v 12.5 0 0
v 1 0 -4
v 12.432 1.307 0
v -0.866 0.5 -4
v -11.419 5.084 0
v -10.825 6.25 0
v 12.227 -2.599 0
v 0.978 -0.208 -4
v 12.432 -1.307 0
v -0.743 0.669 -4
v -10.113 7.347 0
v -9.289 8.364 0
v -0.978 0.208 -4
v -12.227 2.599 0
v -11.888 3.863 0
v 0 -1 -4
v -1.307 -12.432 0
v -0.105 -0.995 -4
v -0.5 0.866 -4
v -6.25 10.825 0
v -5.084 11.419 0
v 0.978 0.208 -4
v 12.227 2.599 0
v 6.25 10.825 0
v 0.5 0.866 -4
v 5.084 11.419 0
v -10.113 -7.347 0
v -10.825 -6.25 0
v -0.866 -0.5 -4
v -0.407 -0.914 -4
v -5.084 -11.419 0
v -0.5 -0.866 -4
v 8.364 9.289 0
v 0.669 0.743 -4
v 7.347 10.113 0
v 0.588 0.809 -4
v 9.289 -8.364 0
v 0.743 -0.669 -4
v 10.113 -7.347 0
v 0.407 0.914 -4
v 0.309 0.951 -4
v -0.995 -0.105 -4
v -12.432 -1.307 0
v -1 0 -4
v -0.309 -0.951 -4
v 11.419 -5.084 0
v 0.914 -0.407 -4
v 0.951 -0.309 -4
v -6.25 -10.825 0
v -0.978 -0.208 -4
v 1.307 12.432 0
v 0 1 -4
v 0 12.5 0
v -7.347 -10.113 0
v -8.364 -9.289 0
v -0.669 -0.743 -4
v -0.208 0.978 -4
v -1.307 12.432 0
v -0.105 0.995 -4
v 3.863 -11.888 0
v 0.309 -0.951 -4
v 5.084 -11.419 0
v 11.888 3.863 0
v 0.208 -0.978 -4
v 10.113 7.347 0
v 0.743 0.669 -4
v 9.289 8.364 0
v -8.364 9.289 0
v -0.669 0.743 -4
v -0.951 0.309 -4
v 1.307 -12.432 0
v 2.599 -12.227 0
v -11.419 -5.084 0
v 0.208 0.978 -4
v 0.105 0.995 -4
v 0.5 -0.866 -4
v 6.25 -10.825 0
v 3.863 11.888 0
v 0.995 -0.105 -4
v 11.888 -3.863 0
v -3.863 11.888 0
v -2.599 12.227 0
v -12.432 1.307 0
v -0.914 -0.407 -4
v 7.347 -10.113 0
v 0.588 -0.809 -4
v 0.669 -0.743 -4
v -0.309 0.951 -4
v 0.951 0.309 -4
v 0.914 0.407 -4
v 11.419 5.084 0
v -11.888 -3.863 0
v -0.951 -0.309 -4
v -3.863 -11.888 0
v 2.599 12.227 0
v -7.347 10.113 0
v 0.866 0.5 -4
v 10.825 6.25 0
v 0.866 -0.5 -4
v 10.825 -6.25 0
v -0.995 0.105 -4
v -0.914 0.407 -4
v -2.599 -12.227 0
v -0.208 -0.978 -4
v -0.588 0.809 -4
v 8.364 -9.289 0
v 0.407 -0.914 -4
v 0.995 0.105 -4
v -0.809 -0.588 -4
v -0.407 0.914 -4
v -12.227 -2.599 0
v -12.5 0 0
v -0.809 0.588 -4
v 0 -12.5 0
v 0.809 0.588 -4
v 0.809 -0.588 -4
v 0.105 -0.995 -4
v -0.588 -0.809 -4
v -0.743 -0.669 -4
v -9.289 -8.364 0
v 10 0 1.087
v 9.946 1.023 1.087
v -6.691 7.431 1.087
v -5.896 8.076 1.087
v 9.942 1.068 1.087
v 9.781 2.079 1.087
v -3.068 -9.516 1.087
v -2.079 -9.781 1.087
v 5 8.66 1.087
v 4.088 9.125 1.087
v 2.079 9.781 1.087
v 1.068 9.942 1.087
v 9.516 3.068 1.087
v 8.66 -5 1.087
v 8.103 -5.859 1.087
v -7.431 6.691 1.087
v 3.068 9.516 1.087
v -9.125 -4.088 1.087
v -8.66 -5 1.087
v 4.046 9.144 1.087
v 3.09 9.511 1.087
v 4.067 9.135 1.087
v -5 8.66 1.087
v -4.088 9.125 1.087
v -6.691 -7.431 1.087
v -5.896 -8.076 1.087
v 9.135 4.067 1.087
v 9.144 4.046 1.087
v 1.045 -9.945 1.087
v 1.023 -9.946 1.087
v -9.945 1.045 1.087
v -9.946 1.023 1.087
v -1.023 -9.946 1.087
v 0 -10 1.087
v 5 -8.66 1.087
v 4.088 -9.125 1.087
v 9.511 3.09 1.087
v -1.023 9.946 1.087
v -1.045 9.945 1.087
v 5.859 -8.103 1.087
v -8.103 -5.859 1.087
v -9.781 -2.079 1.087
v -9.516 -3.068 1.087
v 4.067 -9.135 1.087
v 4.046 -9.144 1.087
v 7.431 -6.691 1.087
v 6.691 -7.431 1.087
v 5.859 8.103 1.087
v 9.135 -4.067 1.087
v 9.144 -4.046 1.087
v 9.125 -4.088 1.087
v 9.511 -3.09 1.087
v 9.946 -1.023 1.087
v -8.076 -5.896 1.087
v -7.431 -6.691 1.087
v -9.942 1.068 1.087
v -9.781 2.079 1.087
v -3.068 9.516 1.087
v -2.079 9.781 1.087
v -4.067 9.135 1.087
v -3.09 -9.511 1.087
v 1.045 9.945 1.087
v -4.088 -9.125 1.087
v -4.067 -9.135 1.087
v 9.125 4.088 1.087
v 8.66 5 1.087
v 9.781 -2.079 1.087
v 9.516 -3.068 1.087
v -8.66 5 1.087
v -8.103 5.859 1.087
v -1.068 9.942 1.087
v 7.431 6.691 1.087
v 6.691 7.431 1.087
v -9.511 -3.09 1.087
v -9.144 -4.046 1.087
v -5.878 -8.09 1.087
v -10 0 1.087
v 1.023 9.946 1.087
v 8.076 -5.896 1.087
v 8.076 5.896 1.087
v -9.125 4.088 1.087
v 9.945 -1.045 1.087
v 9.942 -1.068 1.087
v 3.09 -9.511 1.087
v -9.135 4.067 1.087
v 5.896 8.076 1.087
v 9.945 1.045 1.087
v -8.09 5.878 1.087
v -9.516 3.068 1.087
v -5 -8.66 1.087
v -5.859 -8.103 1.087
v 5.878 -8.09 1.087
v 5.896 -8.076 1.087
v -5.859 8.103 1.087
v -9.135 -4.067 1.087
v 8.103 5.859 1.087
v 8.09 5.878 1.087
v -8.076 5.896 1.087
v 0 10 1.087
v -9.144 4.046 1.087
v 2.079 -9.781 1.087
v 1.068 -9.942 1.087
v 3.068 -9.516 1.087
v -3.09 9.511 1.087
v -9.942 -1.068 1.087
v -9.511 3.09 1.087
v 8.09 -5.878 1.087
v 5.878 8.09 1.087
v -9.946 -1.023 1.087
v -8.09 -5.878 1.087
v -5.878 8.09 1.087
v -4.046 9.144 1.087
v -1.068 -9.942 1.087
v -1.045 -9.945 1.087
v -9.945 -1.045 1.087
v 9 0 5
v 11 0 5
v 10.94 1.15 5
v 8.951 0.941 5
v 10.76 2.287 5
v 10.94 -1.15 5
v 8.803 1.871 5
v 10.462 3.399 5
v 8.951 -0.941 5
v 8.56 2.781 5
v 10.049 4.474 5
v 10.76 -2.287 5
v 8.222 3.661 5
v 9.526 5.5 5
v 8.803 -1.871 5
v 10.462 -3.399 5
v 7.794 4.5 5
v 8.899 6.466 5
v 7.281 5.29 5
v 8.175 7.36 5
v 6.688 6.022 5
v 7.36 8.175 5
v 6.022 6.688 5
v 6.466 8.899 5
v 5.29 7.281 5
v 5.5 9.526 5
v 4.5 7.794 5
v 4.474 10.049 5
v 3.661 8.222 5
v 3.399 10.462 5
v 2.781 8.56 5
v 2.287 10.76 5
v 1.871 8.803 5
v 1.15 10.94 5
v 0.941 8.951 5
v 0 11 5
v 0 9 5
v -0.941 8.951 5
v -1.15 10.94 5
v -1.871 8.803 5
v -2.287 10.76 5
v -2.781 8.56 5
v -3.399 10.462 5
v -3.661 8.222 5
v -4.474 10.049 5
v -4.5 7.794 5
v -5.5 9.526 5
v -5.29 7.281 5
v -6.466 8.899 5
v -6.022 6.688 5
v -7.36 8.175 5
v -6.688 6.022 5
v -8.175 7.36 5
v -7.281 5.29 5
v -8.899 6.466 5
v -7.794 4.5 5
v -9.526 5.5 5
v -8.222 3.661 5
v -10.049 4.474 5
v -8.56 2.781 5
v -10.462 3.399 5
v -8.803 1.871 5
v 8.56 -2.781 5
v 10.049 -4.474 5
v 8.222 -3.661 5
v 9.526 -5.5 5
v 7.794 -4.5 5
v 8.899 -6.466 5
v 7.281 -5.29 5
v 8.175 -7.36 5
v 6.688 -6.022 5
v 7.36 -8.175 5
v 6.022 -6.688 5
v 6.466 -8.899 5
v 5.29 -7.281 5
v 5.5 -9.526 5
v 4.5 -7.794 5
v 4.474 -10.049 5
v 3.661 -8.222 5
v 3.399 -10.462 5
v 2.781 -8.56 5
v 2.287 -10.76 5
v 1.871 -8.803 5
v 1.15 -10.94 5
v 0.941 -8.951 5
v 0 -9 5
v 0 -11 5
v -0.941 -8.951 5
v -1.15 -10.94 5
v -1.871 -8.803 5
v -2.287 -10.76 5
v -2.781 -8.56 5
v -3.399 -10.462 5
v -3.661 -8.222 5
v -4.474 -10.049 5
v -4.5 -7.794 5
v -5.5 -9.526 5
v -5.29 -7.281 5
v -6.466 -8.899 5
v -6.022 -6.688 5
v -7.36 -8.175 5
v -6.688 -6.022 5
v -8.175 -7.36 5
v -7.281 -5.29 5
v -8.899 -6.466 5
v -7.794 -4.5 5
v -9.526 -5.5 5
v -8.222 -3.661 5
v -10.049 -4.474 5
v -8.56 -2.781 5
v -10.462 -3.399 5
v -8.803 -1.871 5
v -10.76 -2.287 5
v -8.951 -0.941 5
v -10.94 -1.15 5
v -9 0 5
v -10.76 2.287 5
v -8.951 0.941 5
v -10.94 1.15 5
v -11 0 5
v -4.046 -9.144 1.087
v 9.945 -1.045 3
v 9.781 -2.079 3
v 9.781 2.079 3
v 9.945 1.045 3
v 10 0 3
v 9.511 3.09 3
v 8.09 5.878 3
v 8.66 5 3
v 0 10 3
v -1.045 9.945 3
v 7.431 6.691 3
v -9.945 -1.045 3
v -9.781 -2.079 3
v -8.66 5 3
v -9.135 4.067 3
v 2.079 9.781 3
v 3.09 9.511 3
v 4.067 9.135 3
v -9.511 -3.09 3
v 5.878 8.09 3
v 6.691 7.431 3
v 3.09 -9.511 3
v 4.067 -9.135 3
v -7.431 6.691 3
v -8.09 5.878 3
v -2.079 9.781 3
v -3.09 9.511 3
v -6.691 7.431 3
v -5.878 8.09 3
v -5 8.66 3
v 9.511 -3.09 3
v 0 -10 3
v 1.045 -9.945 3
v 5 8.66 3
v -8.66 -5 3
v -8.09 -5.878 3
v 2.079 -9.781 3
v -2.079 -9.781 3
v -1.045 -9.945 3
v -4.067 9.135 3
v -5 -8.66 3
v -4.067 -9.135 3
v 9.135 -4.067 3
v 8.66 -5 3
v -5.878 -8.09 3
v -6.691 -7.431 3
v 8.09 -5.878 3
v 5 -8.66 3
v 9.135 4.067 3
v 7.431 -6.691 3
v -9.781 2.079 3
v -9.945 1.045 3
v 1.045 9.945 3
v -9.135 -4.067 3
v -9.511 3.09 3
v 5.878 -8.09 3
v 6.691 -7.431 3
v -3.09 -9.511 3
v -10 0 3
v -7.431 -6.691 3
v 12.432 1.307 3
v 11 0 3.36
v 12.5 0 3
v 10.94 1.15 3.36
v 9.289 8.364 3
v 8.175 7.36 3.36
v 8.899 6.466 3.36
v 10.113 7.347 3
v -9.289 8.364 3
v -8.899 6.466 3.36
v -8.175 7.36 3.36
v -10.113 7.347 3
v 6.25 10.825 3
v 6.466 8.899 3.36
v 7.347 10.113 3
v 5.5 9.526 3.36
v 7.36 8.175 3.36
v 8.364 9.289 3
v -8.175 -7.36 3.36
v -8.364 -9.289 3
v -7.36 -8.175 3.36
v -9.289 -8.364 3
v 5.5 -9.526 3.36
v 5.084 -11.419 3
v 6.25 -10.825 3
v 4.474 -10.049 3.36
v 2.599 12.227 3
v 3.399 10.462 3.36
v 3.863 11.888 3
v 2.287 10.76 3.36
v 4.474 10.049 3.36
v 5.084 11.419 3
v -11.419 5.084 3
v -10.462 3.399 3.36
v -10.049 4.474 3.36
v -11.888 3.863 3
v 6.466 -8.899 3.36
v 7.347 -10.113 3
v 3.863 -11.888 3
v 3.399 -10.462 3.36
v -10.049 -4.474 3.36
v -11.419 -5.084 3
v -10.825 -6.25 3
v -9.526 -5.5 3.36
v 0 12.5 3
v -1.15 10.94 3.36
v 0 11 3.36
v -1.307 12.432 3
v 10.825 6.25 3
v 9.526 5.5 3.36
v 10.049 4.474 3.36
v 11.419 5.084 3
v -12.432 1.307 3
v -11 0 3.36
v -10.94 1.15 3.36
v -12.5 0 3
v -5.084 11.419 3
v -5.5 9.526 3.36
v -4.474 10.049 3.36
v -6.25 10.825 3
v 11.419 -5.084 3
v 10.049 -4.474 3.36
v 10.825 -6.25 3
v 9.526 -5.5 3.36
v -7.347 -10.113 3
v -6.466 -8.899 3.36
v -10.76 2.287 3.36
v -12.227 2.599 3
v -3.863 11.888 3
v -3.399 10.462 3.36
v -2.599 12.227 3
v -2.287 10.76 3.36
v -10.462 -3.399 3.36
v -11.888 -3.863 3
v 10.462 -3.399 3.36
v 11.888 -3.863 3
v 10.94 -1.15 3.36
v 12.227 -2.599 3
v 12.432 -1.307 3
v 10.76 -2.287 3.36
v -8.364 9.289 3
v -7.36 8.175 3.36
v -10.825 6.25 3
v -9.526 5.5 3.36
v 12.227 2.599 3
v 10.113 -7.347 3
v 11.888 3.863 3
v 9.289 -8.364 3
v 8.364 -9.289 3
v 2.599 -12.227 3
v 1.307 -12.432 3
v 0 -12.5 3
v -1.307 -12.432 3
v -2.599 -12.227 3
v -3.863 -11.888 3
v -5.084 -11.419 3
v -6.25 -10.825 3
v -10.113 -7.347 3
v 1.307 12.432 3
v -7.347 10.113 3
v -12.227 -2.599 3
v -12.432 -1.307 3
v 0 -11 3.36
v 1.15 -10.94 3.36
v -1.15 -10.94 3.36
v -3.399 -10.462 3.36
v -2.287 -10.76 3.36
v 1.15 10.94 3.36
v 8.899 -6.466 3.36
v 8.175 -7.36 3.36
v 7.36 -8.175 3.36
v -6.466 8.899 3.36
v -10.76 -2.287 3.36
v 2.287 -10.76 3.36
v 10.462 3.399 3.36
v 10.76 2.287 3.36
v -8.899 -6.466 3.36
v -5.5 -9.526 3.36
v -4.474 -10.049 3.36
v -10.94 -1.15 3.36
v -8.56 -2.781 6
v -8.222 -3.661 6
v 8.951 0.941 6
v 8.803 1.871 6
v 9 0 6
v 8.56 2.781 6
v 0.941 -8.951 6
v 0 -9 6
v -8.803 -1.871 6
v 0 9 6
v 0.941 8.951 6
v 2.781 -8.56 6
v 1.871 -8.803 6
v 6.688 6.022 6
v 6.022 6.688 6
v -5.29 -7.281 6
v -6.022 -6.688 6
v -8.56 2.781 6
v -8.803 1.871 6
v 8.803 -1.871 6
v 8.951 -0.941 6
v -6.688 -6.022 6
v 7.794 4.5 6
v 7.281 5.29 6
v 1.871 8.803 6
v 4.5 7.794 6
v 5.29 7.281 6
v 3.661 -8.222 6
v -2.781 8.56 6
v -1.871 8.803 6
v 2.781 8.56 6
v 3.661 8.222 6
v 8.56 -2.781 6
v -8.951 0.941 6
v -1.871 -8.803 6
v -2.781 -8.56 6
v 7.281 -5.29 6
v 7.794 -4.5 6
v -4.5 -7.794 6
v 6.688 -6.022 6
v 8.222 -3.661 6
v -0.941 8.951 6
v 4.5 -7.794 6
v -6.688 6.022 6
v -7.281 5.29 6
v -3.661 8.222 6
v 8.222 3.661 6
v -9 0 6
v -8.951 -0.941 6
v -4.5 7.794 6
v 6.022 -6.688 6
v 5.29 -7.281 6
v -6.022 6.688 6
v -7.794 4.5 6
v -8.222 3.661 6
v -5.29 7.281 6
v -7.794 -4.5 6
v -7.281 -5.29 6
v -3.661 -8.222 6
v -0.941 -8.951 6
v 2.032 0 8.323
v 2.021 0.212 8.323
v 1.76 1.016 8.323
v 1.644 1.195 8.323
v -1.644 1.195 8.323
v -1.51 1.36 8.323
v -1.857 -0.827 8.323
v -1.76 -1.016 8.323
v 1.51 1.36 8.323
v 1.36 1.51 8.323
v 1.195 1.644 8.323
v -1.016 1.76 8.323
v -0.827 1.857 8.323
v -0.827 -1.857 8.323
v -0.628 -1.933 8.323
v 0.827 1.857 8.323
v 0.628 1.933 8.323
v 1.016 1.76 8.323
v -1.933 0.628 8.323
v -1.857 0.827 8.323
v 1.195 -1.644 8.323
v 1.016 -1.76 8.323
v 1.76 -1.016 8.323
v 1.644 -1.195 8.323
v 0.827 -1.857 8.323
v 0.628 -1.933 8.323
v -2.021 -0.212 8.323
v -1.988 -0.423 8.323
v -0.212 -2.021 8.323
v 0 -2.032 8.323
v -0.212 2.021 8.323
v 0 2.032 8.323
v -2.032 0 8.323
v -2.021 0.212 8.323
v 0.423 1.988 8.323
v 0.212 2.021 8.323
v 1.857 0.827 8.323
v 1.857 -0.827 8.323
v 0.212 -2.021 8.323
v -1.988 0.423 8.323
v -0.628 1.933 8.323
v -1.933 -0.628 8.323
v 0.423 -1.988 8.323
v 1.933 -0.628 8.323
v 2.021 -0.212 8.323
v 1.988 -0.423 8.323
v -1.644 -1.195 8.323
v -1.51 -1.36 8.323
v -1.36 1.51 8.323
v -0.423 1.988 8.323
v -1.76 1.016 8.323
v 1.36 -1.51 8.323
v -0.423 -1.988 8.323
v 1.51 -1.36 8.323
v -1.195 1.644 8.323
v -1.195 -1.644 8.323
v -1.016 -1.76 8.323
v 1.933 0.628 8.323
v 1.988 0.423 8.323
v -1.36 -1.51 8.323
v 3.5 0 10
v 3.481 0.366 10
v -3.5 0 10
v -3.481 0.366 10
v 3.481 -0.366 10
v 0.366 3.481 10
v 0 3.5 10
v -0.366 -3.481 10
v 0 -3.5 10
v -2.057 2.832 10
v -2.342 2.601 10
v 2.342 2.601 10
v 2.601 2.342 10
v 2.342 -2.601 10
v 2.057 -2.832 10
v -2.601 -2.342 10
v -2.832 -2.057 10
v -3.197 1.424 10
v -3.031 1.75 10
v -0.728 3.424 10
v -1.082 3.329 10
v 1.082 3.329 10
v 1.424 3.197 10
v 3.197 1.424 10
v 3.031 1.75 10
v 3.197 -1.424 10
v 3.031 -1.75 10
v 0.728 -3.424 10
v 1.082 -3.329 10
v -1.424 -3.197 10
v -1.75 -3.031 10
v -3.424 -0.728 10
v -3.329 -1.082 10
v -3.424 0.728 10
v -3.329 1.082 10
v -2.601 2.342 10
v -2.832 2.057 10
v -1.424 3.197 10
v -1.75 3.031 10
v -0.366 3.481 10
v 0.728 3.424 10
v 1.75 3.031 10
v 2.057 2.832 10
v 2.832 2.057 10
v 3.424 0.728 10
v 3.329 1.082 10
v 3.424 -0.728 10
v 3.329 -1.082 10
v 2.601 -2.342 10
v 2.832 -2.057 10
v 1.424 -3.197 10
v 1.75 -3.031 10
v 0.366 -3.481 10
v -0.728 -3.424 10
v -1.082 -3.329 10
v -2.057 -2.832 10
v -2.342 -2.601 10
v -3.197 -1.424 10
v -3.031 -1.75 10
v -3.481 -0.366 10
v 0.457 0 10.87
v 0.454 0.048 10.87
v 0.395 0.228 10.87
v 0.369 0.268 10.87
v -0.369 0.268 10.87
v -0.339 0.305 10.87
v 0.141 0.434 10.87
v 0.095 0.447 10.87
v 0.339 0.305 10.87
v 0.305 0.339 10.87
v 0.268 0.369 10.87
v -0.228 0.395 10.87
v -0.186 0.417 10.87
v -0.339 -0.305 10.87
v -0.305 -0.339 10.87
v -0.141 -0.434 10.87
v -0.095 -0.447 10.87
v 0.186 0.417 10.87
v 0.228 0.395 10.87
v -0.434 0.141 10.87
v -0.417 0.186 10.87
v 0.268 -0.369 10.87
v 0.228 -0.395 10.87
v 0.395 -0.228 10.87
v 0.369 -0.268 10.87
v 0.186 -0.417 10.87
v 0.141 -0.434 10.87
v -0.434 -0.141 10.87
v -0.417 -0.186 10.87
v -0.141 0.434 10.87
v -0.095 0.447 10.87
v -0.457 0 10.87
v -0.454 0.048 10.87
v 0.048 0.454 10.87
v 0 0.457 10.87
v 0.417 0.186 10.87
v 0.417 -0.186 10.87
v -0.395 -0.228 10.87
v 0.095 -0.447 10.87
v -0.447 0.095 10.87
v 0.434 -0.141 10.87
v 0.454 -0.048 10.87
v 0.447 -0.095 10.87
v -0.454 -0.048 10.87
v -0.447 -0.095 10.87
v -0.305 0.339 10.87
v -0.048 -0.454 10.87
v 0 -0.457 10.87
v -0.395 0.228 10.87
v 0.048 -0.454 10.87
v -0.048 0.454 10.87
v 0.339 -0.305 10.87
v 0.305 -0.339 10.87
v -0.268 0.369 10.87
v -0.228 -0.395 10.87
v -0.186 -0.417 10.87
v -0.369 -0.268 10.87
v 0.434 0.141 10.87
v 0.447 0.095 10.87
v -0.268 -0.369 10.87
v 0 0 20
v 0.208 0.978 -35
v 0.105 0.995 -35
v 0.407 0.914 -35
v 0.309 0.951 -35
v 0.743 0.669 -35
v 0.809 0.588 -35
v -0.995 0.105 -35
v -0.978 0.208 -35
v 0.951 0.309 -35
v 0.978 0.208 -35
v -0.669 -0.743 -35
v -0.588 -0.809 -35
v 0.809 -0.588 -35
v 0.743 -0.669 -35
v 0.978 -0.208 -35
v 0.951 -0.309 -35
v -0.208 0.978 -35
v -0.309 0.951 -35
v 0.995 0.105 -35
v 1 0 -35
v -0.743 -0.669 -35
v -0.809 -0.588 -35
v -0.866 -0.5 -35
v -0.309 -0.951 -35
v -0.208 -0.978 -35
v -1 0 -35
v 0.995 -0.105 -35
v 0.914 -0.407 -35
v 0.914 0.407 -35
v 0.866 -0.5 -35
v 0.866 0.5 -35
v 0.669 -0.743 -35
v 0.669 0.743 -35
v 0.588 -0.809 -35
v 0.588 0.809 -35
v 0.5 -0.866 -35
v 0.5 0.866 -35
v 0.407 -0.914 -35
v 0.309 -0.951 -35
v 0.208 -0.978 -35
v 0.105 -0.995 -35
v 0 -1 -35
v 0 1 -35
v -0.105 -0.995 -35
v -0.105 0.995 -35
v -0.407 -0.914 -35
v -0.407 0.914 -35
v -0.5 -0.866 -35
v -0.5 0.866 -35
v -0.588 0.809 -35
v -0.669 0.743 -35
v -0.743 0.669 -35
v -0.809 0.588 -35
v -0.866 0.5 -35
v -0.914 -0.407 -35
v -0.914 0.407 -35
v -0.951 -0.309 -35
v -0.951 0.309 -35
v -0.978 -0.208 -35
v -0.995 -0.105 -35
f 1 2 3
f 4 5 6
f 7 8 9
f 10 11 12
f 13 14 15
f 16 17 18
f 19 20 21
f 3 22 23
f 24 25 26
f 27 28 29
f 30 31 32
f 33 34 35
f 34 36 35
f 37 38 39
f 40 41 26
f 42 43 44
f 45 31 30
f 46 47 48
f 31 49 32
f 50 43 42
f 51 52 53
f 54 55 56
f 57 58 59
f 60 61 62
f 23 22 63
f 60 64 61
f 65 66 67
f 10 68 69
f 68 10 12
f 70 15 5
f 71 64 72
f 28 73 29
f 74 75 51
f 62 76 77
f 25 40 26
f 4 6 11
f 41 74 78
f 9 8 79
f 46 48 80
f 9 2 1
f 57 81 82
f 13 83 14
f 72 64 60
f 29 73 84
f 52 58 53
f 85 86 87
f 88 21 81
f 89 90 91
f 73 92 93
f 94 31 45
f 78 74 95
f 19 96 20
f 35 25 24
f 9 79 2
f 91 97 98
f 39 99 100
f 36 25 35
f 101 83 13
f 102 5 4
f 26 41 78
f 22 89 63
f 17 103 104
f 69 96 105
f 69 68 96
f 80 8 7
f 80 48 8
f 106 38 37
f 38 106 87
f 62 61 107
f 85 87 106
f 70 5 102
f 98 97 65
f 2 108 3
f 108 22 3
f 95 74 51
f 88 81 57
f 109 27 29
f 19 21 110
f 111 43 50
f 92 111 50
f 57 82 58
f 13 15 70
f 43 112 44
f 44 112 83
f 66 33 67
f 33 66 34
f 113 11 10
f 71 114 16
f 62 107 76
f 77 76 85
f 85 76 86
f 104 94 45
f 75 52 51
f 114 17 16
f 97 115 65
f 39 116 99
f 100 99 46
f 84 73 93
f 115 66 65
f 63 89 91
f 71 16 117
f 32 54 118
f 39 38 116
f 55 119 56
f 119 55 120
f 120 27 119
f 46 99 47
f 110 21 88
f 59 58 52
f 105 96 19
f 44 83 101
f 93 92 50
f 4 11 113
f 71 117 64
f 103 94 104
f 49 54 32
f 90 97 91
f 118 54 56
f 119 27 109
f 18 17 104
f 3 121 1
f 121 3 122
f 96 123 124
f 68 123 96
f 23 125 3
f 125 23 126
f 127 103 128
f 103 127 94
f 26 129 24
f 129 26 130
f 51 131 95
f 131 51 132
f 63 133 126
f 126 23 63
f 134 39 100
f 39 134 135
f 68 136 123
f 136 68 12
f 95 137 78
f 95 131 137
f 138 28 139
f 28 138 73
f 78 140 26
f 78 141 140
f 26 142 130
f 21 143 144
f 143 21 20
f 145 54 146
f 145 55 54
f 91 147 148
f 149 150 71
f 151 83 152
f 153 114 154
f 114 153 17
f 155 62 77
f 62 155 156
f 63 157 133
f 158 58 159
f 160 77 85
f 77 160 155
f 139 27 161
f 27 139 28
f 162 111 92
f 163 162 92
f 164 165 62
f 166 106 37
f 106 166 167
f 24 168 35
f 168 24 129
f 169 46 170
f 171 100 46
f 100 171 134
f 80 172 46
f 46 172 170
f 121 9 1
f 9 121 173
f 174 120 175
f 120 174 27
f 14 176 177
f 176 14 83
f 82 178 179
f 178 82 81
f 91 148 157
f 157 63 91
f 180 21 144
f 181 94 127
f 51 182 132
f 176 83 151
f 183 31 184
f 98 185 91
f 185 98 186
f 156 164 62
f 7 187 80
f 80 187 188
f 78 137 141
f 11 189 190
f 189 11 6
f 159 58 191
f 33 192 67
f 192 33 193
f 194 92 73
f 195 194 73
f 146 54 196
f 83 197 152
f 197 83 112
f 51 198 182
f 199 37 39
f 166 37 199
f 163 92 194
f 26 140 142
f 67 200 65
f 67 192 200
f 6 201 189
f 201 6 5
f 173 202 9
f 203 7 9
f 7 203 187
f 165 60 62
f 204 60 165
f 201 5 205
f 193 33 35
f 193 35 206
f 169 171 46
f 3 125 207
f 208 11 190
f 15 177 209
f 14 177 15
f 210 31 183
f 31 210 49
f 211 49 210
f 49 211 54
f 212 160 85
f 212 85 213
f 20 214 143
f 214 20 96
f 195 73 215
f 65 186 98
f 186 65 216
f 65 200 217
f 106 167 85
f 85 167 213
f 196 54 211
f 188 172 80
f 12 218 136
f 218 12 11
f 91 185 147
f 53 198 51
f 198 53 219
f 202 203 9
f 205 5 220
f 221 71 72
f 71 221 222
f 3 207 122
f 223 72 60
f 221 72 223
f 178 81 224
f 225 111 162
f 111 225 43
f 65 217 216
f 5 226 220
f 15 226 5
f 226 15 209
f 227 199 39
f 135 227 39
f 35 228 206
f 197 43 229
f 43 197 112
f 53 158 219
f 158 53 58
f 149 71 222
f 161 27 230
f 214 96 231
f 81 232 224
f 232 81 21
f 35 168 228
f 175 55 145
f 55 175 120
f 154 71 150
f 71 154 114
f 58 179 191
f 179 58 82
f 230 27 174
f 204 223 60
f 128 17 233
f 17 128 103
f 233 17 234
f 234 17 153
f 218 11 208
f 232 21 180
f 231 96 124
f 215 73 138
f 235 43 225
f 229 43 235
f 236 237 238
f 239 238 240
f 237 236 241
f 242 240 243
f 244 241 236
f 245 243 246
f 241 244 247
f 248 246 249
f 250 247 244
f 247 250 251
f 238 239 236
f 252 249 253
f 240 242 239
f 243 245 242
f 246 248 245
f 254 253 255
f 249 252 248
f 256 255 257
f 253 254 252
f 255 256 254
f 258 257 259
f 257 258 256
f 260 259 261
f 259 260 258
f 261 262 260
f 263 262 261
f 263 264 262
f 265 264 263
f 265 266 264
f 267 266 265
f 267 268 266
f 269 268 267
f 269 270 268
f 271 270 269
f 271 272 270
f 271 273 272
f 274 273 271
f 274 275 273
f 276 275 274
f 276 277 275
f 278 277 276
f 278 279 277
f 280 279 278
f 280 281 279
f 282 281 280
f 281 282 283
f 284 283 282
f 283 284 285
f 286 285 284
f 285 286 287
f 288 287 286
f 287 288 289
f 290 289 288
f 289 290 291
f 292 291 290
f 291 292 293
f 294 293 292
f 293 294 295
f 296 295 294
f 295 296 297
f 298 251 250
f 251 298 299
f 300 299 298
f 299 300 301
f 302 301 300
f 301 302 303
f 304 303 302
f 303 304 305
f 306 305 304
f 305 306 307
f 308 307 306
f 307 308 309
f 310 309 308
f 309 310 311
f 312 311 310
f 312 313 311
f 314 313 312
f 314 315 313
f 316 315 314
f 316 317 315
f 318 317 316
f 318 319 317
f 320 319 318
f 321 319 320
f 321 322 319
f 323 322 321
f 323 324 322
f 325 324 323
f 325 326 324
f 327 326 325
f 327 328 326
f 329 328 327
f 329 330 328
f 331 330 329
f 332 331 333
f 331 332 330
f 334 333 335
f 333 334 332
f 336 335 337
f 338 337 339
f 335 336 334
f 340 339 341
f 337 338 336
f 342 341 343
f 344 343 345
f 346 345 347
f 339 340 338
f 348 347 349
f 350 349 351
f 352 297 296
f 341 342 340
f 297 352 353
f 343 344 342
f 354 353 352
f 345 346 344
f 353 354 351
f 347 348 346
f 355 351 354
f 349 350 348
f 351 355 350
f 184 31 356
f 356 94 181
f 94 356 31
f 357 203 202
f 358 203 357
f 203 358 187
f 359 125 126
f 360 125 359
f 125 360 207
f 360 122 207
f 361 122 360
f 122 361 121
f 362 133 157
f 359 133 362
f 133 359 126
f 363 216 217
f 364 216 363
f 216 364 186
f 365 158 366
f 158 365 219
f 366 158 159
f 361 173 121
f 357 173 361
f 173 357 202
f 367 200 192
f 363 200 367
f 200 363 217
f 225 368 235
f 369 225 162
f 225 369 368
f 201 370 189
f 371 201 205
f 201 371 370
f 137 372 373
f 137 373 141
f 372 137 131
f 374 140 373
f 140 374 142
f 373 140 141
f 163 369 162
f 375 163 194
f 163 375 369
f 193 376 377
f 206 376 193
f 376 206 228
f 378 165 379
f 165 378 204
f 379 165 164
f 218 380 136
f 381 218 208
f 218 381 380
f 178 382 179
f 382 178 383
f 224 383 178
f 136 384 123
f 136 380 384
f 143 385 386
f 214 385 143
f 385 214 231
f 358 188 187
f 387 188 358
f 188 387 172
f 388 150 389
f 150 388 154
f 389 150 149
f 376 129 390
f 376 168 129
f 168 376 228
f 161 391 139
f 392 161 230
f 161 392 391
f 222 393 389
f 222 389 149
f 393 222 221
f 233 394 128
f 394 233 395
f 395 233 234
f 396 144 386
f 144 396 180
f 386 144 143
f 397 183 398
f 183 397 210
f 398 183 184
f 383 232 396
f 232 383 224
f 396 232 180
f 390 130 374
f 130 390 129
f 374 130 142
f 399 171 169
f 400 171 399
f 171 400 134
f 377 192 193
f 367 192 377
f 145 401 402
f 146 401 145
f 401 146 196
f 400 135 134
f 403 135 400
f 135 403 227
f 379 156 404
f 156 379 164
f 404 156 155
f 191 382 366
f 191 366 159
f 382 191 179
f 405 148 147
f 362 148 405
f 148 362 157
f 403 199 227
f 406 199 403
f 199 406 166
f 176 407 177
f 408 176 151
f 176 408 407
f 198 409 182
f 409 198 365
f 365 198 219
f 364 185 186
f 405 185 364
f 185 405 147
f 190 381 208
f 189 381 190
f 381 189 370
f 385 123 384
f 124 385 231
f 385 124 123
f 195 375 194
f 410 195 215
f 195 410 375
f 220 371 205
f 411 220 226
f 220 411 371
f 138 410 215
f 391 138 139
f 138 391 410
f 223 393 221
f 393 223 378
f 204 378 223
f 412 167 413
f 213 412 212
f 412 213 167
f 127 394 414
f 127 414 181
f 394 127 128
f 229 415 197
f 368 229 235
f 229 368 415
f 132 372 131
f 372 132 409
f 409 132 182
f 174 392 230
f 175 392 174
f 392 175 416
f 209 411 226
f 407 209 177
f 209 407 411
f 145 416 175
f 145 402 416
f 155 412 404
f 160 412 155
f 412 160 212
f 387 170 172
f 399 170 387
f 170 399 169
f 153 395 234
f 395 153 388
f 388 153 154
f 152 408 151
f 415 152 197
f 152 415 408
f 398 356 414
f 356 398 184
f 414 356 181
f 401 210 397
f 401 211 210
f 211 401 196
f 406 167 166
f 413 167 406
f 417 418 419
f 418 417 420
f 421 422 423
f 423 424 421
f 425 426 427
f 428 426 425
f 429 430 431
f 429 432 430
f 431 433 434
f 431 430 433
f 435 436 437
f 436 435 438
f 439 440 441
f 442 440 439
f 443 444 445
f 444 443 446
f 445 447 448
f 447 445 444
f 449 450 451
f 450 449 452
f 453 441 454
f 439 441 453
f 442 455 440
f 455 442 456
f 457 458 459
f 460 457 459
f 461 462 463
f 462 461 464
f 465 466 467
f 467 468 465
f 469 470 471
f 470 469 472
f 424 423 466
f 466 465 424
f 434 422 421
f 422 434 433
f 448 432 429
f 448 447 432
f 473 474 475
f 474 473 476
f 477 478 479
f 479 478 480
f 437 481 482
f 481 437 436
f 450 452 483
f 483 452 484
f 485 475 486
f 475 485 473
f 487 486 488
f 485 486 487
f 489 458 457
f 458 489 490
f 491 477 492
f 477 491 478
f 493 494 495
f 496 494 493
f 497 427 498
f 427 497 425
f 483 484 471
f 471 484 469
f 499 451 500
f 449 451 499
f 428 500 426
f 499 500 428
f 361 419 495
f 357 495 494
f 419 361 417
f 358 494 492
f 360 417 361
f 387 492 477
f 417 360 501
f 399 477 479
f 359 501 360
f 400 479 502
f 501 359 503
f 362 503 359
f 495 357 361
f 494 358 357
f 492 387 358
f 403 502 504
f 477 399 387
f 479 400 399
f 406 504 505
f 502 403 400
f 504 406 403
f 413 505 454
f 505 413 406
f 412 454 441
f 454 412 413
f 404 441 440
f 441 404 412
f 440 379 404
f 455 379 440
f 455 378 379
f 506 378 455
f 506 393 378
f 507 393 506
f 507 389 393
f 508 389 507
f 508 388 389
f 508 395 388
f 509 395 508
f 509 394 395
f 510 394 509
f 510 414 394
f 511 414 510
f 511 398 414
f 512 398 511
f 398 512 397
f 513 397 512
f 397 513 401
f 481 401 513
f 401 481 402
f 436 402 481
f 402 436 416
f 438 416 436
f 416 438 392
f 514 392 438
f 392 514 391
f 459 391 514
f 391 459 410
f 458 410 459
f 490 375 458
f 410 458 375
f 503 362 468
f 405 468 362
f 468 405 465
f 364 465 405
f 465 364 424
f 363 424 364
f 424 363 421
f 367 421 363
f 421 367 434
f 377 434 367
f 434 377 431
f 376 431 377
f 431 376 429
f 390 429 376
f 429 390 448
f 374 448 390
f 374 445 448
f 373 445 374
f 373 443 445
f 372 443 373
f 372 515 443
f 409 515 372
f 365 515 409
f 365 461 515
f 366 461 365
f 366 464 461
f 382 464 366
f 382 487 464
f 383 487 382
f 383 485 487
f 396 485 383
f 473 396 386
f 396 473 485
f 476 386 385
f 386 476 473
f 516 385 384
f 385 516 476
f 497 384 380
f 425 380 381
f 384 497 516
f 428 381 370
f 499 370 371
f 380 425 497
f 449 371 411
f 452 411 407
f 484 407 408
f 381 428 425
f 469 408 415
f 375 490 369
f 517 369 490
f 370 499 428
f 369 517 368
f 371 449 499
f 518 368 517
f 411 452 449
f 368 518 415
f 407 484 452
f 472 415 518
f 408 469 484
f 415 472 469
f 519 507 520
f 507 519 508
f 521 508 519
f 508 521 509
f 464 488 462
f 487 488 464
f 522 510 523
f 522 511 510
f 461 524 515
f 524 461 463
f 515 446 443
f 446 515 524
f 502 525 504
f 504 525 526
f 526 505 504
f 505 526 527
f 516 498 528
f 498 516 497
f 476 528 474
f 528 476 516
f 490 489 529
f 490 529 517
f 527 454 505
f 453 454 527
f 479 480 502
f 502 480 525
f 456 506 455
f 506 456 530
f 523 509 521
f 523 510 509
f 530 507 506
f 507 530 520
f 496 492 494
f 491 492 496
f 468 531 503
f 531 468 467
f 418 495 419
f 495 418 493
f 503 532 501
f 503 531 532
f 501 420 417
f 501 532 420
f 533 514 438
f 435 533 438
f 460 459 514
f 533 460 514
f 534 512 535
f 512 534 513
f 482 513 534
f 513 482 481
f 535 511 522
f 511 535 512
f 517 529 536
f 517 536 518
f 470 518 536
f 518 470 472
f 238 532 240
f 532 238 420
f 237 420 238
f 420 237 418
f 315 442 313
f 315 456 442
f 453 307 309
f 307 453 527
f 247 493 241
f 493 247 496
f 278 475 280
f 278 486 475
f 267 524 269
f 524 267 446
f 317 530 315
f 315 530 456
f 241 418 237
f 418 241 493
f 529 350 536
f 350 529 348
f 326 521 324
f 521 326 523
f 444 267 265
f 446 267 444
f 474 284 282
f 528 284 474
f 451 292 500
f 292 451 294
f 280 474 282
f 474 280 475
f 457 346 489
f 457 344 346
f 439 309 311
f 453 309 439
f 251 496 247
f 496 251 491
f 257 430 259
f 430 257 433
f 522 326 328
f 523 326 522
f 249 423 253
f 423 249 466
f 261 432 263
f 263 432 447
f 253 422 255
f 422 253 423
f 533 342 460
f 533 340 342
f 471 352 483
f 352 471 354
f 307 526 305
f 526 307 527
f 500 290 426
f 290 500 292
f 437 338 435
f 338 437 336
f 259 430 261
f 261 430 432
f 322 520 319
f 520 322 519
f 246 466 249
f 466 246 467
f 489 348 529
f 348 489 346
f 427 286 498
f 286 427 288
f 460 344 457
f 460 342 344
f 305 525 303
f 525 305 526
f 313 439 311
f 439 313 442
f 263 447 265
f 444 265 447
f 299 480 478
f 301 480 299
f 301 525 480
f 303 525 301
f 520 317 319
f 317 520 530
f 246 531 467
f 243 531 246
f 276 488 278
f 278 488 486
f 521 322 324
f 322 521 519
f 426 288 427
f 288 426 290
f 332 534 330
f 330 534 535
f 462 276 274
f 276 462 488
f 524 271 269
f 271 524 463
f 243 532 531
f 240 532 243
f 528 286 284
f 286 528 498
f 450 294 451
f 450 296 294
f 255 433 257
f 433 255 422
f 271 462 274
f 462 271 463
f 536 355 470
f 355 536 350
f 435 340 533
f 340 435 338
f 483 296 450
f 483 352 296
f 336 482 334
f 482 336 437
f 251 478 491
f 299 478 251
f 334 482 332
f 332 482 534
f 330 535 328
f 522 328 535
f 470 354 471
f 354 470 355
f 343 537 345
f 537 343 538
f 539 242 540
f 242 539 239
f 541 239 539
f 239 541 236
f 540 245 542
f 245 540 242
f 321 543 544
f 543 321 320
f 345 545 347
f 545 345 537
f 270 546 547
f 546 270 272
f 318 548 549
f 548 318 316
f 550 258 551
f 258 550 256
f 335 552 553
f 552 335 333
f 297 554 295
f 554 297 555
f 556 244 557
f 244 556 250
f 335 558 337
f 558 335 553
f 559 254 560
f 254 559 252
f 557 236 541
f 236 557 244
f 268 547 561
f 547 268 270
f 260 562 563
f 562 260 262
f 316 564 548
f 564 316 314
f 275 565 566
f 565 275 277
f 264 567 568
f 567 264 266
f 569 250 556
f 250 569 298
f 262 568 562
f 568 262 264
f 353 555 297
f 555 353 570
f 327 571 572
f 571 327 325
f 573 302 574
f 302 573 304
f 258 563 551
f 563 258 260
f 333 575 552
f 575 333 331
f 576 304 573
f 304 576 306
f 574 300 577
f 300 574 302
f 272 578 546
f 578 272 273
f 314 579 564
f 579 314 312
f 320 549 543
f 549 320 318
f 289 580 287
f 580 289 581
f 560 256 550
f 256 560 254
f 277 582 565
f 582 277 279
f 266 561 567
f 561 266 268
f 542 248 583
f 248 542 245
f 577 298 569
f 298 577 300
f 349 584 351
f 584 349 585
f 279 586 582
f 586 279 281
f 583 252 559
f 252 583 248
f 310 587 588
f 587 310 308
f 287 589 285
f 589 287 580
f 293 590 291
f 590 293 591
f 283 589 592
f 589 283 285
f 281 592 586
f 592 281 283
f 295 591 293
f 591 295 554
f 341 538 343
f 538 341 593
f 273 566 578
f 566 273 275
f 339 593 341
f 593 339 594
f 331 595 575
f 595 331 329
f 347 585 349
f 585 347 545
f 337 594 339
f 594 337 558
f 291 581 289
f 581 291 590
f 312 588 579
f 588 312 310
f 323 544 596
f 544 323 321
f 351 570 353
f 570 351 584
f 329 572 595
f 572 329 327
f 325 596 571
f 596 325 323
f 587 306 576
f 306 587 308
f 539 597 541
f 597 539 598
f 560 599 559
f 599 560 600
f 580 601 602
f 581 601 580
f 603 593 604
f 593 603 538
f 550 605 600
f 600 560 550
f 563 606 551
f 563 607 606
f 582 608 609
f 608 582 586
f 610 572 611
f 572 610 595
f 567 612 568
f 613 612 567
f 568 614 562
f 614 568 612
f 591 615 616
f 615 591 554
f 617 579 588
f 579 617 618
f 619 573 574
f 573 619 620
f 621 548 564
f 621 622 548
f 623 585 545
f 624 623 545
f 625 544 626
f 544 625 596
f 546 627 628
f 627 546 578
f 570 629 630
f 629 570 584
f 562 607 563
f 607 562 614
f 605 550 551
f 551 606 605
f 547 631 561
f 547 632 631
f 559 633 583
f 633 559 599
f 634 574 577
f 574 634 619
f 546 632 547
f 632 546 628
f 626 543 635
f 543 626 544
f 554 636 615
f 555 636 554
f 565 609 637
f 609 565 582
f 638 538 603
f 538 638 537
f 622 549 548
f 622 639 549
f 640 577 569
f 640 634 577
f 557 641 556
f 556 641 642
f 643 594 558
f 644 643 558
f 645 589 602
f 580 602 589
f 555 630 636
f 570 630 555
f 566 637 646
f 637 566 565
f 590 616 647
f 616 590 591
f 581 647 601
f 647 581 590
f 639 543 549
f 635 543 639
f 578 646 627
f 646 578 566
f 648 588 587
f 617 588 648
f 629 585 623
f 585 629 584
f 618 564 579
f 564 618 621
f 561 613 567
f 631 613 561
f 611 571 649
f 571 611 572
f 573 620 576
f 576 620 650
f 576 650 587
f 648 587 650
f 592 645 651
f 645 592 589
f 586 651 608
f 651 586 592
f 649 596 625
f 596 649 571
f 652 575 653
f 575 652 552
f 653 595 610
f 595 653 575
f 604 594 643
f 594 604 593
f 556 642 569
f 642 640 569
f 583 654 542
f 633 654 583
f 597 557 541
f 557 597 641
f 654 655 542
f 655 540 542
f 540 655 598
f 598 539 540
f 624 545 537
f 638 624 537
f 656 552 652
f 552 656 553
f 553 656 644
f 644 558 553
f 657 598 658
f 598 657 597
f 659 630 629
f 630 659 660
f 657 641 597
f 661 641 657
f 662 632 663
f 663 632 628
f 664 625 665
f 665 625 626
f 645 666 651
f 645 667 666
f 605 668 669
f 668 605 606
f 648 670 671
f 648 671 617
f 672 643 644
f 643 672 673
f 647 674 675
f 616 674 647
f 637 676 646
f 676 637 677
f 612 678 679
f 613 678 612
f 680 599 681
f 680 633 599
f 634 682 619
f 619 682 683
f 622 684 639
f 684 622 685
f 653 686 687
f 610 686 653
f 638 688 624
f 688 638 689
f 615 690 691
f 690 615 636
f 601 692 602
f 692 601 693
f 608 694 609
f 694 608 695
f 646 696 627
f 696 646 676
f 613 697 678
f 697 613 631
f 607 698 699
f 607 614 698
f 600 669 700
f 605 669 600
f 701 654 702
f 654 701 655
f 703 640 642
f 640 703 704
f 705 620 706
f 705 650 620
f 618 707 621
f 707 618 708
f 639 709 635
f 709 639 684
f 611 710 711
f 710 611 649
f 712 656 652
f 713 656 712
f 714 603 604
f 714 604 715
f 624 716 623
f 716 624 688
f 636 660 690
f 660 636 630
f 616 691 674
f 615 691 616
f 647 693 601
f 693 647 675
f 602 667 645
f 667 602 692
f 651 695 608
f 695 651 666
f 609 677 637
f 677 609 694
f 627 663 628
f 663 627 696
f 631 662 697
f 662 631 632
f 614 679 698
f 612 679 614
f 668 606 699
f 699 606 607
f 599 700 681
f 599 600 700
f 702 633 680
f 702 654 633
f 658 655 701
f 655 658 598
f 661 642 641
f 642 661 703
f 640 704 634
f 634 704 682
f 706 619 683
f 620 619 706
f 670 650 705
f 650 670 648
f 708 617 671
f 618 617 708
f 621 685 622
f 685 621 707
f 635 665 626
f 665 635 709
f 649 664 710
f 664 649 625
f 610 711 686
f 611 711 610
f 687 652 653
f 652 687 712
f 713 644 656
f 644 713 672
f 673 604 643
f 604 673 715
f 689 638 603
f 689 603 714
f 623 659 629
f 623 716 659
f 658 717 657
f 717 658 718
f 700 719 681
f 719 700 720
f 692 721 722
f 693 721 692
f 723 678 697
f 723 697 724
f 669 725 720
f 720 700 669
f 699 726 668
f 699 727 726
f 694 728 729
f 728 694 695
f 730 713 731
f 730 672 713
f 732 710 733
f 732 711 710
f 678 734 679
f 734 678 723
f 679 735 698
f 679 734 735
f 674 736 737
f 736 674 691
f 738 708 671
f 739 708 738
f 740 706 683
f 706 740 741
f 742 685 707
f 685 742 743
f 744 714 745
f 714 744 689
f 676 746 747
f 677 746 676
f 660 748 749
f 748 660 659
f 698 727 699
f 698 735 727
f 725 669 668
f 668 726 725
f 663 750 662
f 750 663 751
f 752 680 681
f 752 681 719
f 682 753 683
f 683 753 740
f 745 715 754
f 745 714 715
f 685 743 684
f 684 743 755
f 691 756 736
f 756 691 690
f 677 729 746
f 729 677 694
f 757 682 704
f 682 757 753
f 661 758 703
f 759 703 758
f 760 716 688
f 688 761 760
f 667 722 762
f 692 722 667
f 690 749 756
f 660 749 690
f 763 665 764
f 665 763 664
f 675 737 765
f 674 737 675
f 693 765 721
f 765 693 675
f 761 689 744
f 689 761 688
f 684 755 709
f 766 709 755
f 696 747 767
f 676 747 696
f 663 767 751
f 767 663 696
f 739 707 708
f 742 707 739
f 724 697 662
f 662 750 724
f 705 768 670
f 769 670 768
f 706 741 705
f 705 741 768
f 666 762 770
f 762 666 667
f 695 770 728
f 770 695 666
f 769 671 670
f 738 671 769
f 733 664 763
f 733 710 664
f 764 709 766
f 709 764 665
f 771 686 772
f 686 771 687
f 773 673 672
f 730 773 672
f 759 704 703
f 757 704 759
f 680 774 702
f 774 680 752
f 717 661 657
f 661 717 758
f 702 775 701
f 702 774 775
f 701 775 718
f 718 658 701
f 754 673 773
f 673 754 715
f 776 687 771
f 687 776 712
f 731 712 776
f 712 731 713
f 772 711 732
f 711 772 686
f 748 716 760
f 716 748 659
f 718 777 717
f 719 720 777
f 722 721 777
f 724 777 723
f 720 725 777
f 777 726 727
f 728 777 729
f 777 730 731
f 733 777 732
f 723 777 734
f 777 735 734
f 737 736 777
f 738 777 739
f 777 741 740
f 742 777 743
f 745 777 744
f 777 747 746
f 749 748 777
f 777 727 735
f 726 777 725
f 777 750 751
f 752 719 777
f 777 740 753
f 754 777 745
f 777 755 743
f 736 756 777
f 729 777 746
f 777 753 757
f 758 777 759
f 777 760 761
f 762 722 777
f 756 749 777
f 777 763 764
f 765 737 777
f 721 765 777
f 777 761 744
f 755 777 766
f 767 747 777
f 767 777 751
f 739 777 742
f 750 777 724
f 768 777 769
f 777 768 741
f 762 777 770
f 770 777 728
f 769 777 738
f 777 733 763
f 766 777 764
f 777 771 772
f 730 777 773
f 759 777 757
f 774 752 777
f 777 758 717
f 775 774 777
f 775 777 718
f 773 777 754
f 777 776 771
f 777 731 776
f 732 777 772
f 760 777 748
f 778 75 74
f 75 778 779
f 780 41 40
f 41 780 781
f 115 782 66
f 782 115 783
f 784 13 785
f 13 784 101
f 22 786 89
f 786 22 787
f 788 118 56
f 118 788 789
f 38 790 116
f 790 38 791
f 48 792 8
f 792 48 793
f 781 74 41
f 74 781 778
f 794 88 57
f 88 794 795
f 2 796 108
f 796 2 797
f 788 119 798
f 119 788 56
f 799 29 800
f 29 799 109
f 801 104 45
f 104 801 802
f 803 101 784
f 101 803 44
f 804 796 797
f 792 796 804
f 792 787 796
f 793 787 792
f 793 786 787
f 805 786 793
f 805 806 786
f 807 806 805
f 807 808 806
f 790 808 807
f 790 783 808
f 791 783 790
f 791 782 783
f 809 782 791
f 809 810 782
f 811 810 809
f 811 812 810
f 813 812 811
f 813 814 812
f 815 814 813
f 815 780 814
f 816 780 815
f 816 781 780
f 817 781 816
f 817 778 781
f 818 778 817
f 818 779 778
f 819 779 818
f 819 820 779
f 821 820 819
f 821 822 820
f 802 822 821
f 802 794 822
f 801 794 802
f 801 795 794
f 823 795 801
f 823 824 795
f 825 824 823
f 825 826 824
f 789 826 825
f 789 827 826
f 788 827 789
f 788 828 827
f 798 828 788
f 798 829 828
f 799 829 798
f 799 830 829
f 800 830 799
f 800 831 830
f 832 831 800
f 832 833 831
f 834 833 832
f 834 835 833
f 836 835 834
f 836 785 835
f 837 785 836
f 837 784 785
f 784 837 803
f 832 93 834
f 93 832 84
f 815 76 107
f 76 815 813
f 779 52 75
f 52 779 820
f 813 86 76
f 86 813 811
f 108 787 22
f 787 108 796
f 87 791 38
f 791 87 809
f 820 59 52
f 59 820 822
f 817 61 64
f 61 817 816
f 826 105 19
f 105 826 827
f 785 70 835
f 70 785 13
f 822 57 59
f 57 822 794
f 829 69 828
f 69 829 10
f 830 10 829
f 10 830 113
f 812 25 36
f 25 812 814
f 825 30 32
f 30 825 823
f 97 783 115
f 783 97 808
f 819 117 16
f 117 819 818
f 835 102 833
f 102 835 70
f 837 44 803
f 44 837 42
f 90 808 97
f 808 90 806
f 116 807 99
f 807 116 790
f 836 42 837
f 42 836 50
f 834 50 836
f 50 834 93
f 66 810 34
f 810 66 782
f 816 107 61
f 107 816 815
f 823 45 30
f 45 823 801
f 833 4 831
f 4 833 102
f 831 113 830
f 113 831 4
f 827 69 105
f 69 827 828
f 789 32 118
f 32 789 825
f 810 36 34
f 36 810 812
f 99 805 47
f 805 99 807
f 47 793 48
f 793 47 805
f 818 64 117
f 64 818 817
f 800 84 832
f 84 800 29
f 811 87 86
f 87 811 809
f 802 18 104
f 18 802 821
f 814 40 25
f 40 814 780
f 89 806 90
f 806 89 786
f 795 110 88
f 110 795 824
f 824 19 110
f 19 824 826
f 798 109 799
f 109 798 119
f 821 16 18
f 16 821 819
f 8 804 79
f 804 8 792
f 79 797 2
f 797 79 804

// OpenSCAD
$fn=60;

module post() {
	cylinder(h=20, d1=2, d2=0);
}

module hangout() {
	union() {
		mirror([0, 0, 1]) cylinder(h=4, d1=25, d2=2);
		cylinder(h=5, d1=25, d2=2);
		cylinder(h=5, d=20);
		translate([0, 0, 3]) cylinder(h=3, d1=25, d2=0);
		translate([0, 0, 3]) cylinder(h=2, d=22);
		translate([0, 0, 5]) cylinder(h=1, d=18);
		translate([0, 0, 6]) cylinder(h=3, d1=18, d2=0);
		translate([0, 0, 6]) cylinder(h=4, d1=0, d2=7);
		translate([0, 0, 10]) cylinder(h=1, d1=7, d2=0);
	}
}

module spire() {
	mirror([0, 0, -1]) cylinder(h=35, d=2);
}

union() {
	post();
	hangout();
	spire();
}
